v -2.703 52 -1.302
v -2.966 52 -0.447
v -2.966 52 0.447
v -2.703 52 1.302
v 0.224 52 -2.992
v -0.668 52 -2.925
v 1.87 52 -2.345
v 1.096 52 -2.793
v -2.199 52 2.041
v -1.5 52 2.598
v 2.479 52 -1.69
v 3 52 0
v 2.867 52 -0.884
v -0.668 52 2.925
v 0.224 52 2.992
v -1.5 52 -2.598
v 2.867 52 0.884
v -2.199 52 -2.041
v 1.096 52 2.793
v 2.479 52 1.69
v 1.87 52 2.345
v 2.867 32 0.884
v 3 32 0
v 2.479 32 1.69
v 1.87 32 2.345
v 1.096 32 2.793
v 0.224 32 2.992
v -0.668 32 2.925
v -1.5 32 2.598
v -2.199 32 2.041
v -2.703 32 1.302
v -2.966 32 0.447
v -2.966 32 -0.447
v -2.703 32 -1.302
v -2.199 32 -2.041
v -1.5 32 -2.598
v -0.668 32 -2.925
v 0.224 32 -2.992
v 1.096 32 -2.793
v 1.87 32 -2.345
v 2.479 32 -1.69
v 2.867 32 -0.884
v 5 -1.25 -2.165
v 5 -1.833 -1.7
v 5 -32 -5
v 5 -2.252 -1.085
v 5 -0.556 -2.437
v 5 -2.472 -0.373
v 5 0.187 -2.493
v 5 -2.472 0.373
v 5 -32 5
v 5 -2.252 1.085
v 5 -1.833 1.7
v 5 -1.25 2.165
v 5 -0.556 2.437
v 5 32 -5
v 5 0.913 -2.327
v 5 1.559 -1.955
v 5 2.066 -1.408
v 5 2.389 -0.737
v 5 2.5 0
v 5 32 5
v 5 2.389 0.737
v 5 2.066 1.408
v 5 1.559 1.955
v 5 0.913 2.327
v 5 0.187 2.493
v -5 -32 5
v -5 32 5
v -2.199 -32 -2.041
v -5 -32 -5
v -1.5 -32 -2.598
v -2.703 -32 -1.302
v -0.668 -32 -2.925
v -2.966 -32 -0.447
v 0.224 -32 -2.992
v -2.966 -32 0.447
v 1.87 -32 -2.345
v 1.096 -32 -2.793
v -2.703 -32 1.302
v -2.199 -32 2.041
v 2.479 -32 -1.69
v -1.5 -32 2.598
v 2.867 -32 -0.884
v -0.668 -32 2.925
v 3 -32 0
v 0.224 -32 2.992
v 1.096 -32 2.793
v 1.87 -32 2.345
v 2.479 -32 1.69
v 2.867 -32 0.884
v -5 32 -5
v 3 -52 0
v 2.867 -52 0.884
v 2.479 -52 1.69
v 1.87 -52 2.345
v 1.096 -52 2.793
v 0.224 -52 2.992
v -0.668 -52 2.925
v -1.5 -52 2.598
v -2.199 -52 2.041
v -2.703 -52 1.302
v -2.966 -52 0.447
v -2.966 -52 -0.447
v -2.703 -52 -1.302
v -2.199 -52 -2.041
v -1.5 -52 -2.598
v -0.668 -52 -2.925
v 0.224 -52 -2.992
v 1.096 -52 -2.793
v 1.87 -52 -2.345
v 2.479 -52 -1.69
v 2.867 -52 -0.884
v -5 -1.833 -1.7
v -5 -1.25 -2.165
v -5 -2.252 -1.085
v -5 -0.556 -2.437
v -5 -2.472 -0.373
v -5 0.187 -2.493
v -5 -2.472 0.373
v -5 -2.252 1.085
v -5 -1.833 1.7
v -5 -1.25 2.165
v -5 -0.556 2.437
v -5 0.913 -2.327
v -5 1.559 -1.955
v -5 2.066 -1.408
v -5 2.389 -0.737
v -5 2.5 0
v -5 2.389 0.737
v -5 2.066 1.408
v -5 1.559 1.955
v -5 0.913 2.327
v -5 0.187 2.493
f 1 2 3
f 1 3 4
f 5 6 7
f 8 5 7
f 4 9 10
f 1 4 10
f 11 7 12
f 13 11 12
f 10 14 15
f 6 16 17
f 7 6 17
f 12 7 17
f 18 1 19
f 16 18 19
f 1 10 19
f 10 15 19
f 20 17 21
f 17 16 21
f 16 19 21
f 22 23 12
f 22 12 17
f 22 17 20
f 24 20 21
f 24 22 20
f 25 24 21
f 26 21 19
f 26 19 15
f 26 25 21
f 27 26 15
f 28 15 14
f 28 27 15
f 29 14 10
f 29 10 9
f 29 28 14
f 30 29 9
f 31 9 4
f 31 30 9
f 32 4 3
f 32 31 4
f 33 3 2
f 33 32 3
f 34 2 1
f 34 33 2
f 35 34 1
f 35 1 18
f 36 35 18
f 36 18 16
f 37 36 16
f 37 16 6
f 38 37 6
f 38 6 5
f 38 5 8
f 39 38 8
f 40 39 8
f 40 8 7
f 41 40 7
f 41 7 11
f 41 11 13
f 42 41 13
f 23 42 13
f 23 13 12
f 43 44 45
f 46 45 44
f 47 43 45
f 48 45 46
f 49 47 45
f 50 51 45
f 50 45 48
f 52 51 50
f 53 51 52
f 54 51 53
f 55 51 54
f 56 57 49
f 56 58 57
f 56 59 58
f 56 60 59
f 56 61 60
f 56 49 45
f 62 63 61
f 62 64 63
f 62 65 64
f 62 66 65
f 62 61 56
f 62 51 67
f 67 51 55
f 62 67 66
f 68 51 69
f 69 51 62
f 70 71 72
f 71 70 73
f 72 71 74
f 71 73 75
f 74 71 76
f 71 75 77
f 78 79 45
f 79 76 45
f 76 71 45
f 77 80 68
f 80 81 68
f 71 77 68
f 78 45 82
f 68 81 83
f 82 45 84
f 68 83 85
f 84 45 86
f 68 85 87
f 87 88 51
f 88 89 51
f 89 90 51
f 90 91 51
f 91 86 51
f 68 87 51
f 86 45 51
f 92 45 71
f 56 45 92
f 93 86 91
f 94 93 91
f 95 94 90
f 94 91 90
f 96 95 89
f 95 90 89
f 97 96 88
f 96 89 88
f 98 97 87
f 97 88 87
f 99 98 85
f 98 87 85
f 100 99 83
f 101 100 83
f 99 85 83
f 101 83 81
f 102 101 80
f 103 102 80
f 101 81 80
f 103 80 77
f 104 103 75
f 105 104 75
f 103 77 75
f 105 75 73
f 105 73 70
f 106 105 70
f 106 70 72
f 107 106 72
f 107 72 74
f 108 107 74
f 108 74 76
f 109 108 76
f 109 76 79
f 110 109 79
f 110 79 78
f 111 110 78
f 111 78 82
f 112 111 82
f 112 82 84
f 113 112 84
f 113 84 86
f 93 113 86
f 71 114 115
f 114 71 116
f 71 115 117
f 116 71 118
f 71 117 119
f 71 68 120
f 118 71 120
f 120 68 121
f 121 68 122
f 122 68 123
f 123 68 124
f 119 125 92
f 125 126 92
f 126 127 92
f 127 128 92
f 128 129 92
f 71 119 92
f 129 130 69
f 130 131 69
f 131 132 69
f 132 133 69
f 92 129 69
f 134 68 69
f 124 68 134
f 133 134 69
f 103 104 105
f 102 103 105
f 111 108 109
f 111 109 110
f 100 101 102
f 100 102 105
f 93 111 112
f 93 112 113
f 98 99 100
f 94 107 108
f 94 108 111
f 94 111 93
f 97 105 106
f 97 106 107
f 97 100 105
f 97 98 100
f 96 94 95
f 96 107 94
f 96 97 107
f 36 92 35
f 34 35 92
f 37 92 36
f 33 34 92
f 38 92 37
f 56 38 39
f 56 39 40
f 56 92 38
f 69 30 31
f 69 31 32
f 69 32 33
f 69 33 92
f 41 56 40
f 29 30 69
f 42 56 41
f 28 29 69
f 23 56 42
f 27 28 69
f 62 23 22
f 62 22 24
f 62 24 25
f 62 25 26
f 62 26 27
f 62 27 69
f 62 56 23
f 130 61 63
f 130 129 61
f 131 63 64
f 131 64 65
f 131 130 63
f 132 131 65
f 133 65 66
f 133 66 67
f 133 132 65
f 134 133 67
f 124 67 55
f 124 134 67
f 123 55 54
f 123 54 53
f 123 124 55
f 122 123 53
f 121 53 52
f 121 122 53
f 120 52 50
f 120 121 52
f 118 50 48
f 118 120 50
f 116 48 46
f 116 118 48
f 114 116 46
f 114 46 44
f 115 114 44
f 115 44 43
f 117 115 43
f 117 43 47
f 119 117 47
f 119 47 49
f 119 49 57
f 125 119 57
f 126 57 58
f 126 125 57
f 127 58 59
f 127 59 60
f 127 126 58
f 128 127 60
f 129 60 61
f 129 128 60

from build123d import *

# Parameters (mm, degrees)
F0_W     = 64
F0_H     = 10
F0_R     = 2.5
F1_DEPTH = 5
F3_START = 9
F2_R     = 3
F3_DEPTH = 43
F4_START = -10
F4_DEPTH = 42


with BuildPart() as f1:
    # F0 (on Right) → F1 (new body, symmetric)
    with BuildSketch(Plane.YZ):
        Rectangle(F0_W, F0_H)
        Circle(F0_R, mode=Mode.SUBTRACT)
    extrude(amount=F1_DEPTH, both=True)

    # F2 (on Front) → F3 (join)
    with BuildSketch(Plane.XZ.offset(F3_START)):
        Circle(F2_R)
    extrude(amount=F3_DEPTH)

    # F2 (on Front) → F4 (join)
    with BuildSketch(Plane.XZ.offset(F4_START)):
        Circle(F2_R)
    extrude(amount=-F4_DEPTH)


solid = f1.part
